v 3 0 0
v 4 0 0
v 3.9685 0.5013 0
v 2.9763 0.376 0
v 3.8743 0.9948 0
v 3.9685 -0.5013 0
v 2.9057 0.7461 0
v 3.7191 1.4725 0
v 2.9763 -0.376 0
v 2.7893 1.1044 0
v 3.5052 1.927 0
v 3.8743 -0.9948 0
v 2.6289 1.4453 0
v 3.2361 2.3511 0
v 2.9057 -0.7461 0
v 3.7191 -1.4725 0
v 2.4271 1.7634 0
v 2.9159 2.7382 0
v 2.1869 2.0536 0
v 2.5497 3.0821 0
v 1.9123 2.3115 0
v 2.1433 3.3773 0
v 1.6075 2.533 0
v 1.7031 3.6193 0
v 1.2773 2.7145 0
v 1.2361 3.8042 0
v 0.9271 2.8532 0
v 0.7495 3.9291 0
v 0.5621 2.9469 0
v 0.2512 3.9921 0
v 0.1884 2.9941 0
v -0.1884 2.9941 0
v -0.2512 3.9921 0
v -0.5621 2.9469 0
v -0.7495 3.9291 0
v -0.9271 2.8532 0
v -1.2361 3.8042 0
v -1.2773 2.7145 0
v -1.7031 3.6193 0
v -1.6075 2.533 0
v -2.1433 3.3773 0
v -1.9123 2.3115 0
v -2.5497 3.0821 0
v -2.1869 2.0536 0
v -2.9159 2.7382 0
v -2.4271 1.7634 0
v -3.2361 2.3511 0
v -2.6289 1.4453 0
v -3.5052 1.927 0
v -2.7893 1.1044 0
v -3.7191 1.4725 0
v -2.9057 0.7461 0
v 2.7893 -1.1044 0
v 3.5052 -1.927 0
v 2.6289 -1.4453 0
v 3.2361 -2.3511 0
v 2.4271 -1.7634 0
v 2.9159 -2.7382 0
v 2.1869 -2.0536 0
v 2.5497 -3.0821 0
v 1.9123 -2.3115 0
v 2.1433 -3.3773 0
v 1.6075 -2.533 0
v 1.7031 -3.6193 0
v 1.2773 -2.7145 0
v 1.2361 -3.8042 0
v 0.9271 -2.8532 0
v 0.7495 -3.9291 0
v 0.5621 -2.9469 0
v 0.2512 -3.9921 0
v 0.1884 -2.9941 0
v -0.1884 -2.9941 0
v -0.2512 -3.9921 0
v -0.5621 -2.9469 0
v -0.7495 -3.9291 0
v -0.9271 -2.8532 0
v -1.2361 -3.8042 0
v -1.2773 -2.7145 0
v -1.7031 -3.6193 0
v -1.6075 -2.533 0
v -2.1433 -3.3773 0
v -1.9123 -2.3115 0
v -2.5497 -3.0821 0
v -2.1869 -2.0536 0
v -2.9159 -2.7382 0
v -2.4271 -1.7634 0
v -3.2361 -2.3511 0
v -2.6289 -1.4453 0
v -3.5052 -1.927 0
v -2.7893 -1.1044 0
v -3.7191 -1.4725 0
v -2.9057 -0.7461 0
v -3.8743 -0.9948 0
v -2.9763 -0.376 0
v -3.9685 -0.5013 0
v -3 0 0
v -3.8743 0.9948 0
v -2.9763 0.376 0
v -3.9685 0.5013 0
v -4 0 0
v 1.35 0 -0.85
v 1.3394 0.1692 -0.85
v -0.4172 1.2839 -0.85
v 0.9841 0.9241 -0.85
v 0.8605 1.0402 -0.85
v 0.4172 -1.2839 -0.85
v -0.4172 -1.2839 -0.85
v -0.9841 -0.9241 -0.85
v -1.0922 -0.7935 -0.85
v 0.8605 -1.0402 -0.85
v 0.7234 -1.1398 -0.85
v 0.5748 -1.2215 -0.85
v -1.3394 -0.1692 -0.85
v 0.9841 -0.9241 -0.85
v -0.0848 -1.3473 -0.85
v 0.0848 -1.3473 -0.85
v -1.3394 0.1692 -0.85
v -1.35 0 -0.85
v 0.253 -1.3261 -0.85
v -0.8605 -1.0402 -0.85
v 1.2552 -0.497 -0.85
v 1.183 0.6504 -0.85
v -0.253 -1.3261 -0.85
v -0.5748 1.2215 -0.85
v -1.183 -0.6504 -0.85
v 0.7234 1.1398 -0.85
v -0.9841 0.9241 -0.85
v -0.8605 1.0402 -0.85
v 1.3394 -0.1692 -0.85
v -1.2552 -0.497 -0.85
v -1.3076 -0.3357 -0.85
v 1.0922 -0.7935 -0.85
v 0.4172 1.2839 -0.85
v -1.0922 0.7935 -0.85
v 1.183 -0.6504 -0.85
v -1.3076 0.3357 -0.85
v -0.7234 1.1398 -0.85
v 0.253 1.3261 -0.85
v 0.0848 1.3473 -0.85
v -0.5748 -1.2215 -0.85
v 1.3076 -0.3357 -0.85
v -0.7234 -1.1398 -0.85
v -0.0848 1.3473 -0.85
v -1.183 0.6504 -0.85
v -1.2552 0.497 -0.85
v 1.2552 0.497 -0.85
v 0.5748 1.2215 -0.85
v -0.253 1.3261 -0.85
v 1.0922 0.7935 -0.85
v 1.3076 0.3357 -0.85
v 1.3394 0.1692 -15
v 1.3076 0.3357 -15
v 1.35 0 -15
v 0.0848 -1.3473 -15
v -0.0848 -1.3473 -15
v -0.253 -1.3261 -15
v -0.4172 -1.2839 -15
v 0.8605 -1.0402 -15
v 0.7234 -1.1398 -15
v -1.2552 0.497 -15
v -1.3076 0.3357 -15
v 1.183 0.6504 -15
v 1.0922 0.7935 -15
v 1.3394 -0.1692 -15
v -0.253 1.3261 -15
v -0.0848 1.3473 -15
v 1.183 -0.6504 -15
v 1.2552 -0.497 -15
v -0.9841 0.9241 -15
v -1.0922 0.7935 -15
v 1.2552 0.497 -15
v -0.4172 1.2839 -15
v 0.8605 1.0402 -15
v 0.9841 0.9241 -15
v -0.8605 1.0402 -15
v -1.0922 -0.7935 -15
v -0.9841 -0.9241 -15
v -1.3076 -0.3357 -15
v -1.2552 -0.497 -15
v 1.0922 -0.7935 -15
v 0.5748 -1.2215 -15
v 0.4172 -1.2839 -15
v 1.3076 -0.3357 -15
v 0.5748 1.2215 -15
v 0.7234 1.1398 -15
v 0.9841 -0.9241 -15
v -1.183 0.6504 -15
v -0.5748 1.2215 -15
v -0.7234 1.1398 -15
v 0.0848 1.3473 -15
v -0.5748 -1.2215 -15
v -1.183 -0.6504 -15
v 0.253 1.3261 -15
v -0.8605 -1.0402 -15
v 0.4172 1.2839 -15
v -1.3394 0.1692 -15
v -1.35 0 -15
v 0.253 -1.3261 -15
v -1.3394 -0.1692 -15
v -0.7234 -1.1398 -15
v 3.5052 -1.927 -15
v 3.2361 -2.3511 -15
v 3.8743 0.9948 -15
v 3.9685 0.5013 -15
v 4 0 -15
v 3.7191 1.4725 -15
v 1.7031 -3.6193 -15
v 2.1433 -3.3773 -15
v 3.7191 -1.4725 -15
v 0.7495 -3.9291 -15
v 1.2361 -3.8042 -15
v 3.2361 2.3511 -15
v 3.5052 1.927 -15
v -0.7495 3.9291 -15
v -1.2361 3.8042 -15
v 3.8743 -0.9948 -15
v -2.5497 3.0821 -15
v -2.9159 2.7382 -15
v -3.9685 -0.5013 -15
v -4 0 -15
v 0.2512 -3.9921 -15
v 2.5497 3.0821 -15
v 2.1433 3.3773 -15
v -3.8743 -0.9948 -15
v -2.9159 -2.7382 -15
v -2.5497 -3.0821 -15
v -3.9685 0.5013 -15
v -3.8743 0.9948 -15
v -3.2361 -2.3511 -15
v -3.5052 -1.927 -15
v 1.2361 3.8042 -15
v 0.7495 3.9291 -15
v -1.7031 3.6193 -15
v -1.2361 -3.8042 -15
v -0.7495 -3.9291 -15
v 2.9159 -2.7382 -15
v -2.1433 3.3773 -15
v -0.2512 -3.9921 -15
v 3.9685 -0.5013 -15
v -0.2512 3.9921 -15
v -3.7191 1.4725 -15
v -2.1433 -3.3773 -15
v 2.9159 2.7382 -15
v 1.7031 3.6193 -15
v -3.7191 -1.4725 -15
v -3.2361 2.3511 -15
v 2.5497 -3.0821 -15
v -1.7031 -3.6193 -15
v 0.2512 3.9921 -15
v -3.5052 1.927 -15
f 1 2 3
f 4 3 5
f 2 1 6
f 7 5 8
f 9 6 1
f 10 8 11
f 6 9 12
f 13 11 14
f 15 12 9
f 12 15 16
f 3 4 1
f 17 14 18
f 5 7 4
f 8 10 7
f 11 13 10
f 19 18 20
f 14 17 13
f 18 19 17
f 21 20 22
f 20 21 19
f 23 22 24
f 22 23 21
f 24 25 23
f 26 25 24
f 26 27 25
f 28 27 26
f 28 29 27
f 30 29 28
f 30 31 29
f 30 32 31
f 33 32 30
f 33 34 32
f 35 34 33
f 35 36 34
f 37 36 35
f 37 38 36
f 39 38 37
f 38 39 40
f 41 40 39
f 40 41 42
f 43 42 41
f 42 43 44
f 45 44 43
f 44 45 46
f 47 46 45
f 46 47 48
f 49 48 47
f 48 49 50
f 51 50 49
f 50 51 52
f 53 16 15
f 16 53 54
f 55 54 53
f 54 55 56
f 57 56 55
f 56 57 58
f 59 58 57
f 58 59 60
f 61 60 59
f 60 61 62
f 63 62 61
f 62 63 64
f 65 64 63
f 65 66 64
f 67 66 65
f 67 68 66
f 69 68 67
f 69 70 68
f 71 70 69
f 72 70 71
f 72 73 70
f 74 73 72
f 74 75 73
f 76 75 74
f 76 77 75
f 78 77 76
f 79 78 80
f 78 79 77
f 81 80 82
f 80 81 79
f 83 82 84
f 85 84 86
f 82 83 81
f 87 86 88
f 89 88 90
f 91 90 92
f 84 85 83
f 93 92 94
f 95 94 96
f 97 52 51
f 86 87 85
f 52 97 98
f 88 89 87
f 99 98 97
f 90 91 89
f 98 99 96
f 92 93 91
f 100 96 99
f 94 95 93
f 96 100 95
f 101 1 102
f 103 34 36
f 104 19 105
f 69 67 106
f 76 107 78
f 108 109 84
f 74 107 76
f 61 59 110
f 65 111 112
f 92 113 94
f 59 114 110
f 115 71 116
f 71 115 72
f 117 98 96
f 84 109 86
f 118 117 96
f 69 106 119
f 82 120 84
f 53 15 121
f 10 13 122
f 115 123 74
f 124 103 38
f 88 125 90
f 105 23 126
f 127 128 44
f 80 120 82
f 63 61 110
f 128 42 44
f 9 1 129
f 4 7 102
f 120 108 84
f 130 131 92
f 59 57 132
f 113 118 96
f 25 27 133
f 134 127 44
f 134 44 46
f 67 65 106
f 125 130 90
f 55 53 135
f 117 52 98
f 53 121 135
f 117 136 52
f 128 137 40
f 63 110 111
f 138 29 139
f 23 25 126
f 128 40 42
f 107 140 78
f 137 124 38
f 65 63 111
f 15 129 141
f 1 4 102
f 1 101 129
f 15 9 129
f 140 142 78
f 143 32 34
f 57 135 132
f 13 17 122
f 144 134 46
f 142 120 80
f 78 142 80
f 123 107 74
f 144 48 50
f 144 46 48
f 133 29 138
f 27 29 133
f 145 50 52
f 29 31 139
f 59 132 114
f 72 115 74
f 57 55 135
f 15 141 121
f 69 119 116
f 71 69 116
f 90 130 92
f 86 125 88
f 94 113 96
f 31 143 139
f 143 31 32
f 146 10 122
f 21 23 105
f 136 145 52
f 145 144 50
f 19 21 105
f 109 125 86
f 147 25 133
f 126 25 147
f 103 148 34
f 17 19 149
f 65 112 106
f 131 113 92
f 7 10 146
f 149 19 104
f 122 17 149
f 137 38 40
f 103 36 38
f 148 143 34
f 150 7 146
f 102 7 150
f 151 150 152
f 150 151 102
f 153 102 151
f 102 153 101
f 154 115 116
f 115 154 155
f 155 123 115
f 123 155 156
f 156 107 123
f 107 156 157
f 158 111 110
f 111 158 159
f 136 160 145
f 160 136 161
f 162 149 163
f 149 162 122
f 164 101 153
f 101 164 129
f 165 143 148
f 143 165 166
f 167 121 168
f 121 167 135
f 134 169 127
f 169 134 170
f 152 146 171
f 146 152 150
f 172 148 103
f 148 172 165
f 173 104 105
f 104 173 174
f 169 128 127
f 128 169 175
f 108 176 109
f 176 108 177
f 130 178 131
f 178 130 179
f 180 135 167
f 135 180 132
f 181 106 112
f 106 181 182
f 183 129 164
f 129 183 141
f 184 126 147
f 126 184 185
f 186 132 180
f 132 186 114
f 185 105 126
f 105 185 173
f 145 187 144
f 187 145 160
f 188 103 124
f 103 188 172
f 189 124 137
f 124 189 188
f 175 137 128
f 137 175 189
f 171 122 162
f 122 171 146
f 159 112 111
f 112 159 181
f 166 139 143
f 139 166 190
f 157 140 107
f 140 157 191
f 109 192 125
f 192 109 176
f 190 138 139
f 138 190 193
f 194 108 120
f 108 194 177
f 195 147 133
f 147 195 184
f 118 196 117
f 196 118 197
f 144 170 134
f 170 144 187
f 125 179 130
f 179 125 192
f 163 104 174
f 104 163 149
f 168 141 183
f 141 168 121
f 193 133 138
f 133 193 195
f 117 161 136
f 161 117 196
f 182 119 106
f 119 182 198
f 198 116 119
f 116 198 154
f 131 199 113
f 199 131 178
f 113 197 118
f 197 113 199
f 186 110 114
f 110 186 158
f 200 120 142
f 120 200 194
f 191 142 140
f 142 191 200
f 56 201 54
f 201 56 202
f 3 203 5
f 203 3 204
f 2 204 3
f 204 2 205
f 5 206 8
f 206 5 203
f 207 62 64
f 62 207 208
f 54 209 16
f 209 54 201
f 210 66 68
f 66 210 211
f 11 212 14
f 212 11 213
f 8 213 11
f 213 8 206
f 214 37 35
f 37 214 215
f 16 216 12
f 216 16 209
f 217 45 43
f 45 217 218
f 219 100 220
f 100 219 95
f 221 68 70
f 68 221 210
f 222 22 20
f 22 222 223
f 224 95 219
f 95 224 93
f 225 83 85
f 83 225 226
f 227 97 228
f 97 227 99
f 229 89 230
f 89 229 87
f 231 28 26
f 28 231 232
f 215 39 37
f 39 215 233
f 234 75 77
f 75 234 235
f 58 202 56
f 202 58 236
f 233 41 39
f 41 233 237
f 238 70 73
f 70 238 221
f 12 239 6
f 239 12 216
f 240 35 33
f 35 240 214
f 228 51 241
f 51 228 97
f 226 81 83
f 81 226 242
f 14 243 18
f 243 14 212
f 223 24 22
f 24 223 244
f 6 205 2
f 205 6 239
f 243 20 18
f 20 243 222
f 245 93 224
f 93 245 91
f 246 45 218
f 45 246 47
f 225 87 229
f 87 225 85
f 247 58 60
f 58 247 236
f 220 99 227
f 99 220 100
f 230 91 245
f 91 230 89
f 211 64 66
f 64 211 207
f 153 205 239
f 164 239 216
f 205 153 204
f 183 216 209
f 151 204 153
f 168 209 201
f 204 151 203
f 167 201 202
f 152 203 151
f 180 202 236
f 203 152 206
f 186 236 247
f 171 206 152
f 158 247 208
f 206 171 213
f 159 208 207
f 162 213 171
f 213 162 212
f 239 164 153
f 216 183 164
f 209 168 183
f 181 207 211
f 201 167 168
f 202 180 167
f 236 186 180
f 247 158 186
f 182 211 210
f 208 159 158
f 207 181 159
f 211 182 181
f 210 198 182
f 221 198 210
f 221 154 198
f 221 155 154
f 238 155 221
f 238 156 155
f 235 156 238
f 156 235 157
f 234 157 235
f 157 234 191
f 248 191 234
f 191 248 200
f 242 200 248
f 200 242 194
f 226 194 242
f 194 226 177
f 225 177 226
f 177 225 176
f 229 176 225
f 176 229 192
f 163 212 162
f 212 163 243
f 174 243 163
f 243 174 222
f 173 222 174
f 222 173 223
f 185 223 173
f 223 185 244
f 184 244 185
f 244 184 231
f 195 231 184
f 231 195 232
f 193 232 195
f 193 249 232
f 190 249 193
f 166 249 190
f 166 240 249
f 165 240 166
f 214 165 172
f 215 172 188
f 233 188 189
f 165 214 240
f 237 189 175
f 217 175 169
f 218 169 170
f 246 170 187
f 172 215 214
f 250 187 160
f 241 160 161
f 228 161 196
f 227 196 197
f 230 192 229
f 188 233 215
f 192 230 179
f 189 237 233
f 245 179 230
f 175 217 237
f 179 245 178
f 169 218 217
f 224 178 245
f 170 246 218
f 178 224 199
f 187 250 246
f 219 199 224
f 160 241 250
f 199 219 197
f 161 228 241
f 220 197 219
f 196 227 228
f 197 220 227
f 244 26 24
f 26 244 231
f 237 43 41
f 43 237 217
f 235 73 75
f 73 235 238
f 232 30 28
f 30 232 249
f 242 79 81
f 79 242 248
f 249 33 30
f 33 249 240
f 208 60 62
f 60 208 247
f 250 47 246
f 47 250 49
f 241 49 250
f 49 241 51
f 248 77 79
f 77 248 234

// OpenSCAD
$fn = 50;

difference() {
	union() {
		translate(v = [0, 0, -15.0]) {
			cylinder(h = 18, r = 4.0);
		}
	}
	union() {
		translate(v = [0, 0, 0]) {
			rotate(a = [0, 0, 0]) {
				difference() {
					union() {
						translate(v = [0, 0, -18.0]) {
							cylinder(h = 18, r = 1.0);
						}
						translate(v = [0, 0, -0.85]) {
							cylinder(h = 0.85, r1 = 1.35, r2 = 3.0);
						}
						translate(v = [0, 0, -18.0]) {
							cylinder(h = 18, r = 1.35);
						}
						translate(v = [0, 0, -18.0]) {
							cylinder(h = 18, r = 1.0);
						}
					}
					union();
				}
			}
		}
		#cylinder(h = 3, r = 5.0);
	}
}
